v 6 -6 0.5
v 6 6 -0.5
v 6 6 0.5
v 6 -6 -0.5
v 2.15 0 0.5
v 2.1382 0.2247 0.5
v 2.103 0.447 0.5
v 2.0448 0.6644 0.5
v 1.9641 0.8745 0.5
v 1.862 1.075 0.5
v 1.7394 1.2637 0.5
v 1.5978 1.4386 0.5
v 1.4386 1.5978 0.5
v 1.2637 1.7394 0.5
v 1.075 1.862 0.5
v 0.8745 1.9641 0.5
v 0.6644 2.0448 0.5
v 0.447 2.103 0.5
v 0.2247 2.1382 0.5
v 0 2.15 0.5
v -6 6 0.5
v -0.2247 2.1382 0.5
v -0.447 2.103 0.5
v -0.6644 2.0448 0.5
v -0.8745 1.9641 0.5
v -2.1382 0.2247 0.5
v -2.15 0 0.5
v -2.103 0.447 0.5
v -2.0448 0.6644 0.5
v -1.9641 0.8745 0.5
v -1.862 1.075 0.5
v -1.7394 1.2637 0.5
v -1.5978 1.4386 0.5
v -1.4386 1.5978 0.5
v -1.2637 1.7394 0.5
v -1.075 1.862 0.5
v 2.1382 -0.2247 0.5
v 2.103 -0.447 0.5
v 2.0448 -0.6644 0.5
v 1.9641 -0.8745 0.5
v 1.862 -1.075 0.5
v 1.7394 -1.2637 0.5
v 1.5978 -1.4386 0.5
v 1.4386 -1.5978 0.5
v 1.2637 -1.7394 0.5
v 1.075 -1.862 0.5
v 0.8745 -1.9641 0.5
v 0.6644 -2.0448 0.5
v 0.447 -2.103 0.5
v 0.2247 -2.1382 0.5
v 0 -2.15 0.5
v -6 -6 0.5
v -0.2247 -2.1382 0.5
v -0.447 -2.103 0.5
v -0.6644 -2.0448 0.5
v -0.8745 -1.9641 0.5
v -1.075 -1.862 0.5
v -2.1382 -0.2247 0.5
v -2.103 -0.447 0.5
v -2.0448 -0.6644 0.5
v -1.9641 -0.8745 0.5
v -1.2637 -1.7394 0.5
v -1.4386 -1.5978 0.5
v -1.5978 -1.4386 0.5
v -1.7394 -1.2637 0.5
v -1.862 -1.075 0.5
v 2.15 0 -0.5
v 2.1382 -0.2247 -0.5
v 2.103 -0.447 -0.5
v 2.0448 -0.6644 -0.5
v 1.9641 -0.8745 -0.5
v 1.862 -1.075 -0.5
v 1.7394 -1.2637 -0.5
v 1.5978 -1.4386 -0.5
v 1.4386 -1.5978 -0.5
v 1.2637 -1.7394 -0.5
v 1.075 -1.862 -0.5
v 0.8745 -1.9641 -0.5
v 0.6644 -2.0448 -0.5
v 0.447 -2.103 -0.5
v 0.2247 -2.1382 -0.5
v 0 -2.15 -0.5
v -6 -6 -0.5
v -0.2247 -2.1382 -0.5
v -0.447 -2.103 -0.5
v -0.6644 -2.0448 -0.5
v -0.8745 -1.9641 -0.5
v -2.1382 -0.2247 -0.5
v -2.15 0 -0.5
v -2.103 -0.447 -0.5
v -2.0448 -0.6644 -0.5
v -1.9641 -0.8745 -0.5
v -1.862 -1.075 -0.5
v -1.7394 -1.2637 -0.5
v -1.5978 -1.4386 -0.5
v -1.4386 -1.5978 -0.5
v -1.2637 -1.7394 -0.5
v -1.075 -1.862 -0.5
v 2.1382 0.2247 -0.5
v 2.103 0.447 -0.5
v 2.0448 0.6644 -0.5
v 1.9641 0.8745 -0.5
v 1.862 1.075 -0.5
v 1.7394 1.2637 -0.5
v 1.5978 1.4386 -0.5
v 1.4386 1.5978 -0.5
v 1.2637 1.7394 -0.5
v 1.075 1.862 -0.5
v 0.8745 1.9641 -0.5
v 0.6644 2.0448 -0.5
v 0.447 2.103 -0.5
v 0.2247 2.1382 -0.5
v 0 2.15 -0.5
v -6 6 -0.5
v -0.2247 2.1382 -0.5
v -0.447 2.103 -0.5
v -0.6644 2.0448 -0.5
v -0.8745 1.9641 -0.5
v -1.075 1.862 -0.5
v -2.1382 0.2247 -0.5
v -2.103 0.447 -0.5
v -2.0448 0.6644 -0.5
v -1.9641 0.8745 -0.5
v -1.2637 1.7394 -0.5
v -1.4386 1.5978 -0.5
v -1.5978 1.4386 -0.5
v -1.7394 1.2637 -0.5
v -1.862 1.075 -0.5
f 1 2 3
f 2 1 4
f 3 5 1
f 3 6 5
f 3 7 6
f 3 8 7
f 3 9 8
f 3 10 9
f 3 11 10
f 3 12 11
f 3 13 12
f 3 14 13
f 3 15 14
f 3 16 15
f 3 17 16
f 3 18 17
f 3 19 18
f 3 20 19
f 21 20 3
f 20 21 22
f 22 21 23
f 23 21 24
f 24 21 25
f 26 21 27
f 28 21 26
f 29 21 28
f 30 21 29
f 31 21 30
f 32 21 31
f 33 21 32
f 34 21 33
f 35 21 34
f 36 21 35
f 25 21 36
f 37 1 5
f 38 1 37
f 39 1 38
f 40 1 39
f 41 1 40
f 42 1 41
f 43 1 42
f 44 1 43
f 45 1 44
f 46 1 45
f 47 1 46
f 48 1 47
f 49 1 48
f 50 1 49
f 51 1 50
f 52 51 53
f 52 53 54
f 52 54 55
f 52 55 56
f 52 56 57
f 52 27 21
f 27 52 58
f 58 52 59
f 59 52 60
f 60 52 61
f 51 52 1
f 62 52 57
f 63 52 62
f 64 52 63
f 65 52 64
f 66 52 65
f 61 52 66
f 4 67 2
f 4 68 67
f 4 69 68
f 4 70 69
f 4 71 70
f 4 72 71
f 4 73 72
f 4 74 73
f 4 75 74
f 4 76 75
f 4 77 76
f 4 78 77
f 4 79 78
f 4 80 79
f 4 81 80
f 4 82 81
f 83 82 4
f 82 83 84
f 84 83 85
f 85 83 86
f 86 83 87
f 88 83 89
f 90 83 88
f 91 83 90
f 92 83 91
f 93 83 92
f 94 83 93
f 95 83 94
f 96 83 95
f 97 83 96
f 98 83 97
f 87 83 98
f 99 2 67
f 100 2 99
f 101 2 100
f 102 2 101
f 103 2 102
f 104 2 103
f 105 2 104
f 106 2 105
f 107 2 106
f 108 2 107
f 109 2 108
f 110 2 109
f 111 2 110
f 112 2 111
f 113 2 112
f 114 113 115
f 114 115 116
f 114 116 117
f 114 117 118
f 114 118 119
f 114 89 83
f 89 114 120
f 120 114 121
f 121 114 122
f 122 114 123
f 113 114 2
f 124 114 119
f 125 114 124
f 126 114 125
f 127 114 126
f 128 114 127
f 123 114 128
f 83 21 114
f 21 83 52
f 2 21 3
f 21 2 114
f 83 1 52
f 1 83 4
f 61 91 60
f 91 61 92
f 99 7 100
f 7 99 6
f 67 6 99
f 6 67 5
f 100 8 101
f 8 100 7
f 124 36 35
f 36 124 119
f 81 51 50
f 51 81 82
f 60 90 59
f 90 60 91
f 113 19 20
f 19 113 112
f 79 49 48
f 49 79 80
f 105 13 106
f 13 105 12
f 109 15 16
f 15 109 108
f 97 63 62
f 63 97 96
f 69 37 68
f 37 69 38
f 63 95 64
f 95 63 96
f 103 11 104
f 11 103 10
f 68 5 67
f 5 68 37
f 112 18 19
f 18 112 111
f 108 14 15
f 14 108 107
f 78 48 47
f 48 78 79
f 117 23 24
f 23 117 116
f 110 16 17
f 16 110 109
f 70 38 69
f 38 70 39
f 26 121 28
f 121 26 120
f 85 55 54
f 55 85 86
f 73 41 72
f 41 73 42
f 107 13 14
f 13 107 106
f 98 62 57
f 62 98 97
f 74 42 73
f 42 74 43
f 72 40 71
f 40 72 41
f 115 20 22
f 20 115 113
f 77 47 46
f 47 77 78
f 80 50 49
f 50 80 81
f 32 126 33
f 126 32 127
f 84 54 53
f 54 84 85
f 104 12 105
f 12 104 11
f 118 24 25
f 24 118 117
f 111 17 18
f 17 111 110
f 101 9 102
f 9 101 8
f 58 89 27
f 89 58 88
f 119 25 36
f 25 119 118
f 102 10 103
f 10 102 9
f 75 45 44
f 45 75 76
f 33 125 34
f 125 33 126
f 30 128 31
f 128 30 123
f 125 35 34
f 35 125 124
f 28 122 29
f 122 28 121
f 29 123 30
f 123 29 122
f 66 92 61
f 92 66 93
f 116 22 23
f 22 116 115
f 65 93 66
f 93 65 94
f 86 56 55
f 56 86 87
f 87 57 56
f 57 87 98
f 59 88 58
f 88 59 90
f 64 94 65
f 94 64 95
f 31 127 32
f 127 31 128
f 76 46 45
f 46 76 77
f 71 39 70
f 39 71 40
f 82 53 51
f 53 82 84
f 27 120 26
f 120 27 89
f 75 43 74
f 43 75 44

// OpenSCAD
// Square mounting washer.
$fn = 60;
eps = 0.02;
hole_d = 4.3;
side = 12;
thickness = 1;
difference() {
    cube([side,side,thickness],center=true);
    translate([0,0,-thickness/2-eps]) cylinder(d=hole_d,h=thickness+2*eps);
}
